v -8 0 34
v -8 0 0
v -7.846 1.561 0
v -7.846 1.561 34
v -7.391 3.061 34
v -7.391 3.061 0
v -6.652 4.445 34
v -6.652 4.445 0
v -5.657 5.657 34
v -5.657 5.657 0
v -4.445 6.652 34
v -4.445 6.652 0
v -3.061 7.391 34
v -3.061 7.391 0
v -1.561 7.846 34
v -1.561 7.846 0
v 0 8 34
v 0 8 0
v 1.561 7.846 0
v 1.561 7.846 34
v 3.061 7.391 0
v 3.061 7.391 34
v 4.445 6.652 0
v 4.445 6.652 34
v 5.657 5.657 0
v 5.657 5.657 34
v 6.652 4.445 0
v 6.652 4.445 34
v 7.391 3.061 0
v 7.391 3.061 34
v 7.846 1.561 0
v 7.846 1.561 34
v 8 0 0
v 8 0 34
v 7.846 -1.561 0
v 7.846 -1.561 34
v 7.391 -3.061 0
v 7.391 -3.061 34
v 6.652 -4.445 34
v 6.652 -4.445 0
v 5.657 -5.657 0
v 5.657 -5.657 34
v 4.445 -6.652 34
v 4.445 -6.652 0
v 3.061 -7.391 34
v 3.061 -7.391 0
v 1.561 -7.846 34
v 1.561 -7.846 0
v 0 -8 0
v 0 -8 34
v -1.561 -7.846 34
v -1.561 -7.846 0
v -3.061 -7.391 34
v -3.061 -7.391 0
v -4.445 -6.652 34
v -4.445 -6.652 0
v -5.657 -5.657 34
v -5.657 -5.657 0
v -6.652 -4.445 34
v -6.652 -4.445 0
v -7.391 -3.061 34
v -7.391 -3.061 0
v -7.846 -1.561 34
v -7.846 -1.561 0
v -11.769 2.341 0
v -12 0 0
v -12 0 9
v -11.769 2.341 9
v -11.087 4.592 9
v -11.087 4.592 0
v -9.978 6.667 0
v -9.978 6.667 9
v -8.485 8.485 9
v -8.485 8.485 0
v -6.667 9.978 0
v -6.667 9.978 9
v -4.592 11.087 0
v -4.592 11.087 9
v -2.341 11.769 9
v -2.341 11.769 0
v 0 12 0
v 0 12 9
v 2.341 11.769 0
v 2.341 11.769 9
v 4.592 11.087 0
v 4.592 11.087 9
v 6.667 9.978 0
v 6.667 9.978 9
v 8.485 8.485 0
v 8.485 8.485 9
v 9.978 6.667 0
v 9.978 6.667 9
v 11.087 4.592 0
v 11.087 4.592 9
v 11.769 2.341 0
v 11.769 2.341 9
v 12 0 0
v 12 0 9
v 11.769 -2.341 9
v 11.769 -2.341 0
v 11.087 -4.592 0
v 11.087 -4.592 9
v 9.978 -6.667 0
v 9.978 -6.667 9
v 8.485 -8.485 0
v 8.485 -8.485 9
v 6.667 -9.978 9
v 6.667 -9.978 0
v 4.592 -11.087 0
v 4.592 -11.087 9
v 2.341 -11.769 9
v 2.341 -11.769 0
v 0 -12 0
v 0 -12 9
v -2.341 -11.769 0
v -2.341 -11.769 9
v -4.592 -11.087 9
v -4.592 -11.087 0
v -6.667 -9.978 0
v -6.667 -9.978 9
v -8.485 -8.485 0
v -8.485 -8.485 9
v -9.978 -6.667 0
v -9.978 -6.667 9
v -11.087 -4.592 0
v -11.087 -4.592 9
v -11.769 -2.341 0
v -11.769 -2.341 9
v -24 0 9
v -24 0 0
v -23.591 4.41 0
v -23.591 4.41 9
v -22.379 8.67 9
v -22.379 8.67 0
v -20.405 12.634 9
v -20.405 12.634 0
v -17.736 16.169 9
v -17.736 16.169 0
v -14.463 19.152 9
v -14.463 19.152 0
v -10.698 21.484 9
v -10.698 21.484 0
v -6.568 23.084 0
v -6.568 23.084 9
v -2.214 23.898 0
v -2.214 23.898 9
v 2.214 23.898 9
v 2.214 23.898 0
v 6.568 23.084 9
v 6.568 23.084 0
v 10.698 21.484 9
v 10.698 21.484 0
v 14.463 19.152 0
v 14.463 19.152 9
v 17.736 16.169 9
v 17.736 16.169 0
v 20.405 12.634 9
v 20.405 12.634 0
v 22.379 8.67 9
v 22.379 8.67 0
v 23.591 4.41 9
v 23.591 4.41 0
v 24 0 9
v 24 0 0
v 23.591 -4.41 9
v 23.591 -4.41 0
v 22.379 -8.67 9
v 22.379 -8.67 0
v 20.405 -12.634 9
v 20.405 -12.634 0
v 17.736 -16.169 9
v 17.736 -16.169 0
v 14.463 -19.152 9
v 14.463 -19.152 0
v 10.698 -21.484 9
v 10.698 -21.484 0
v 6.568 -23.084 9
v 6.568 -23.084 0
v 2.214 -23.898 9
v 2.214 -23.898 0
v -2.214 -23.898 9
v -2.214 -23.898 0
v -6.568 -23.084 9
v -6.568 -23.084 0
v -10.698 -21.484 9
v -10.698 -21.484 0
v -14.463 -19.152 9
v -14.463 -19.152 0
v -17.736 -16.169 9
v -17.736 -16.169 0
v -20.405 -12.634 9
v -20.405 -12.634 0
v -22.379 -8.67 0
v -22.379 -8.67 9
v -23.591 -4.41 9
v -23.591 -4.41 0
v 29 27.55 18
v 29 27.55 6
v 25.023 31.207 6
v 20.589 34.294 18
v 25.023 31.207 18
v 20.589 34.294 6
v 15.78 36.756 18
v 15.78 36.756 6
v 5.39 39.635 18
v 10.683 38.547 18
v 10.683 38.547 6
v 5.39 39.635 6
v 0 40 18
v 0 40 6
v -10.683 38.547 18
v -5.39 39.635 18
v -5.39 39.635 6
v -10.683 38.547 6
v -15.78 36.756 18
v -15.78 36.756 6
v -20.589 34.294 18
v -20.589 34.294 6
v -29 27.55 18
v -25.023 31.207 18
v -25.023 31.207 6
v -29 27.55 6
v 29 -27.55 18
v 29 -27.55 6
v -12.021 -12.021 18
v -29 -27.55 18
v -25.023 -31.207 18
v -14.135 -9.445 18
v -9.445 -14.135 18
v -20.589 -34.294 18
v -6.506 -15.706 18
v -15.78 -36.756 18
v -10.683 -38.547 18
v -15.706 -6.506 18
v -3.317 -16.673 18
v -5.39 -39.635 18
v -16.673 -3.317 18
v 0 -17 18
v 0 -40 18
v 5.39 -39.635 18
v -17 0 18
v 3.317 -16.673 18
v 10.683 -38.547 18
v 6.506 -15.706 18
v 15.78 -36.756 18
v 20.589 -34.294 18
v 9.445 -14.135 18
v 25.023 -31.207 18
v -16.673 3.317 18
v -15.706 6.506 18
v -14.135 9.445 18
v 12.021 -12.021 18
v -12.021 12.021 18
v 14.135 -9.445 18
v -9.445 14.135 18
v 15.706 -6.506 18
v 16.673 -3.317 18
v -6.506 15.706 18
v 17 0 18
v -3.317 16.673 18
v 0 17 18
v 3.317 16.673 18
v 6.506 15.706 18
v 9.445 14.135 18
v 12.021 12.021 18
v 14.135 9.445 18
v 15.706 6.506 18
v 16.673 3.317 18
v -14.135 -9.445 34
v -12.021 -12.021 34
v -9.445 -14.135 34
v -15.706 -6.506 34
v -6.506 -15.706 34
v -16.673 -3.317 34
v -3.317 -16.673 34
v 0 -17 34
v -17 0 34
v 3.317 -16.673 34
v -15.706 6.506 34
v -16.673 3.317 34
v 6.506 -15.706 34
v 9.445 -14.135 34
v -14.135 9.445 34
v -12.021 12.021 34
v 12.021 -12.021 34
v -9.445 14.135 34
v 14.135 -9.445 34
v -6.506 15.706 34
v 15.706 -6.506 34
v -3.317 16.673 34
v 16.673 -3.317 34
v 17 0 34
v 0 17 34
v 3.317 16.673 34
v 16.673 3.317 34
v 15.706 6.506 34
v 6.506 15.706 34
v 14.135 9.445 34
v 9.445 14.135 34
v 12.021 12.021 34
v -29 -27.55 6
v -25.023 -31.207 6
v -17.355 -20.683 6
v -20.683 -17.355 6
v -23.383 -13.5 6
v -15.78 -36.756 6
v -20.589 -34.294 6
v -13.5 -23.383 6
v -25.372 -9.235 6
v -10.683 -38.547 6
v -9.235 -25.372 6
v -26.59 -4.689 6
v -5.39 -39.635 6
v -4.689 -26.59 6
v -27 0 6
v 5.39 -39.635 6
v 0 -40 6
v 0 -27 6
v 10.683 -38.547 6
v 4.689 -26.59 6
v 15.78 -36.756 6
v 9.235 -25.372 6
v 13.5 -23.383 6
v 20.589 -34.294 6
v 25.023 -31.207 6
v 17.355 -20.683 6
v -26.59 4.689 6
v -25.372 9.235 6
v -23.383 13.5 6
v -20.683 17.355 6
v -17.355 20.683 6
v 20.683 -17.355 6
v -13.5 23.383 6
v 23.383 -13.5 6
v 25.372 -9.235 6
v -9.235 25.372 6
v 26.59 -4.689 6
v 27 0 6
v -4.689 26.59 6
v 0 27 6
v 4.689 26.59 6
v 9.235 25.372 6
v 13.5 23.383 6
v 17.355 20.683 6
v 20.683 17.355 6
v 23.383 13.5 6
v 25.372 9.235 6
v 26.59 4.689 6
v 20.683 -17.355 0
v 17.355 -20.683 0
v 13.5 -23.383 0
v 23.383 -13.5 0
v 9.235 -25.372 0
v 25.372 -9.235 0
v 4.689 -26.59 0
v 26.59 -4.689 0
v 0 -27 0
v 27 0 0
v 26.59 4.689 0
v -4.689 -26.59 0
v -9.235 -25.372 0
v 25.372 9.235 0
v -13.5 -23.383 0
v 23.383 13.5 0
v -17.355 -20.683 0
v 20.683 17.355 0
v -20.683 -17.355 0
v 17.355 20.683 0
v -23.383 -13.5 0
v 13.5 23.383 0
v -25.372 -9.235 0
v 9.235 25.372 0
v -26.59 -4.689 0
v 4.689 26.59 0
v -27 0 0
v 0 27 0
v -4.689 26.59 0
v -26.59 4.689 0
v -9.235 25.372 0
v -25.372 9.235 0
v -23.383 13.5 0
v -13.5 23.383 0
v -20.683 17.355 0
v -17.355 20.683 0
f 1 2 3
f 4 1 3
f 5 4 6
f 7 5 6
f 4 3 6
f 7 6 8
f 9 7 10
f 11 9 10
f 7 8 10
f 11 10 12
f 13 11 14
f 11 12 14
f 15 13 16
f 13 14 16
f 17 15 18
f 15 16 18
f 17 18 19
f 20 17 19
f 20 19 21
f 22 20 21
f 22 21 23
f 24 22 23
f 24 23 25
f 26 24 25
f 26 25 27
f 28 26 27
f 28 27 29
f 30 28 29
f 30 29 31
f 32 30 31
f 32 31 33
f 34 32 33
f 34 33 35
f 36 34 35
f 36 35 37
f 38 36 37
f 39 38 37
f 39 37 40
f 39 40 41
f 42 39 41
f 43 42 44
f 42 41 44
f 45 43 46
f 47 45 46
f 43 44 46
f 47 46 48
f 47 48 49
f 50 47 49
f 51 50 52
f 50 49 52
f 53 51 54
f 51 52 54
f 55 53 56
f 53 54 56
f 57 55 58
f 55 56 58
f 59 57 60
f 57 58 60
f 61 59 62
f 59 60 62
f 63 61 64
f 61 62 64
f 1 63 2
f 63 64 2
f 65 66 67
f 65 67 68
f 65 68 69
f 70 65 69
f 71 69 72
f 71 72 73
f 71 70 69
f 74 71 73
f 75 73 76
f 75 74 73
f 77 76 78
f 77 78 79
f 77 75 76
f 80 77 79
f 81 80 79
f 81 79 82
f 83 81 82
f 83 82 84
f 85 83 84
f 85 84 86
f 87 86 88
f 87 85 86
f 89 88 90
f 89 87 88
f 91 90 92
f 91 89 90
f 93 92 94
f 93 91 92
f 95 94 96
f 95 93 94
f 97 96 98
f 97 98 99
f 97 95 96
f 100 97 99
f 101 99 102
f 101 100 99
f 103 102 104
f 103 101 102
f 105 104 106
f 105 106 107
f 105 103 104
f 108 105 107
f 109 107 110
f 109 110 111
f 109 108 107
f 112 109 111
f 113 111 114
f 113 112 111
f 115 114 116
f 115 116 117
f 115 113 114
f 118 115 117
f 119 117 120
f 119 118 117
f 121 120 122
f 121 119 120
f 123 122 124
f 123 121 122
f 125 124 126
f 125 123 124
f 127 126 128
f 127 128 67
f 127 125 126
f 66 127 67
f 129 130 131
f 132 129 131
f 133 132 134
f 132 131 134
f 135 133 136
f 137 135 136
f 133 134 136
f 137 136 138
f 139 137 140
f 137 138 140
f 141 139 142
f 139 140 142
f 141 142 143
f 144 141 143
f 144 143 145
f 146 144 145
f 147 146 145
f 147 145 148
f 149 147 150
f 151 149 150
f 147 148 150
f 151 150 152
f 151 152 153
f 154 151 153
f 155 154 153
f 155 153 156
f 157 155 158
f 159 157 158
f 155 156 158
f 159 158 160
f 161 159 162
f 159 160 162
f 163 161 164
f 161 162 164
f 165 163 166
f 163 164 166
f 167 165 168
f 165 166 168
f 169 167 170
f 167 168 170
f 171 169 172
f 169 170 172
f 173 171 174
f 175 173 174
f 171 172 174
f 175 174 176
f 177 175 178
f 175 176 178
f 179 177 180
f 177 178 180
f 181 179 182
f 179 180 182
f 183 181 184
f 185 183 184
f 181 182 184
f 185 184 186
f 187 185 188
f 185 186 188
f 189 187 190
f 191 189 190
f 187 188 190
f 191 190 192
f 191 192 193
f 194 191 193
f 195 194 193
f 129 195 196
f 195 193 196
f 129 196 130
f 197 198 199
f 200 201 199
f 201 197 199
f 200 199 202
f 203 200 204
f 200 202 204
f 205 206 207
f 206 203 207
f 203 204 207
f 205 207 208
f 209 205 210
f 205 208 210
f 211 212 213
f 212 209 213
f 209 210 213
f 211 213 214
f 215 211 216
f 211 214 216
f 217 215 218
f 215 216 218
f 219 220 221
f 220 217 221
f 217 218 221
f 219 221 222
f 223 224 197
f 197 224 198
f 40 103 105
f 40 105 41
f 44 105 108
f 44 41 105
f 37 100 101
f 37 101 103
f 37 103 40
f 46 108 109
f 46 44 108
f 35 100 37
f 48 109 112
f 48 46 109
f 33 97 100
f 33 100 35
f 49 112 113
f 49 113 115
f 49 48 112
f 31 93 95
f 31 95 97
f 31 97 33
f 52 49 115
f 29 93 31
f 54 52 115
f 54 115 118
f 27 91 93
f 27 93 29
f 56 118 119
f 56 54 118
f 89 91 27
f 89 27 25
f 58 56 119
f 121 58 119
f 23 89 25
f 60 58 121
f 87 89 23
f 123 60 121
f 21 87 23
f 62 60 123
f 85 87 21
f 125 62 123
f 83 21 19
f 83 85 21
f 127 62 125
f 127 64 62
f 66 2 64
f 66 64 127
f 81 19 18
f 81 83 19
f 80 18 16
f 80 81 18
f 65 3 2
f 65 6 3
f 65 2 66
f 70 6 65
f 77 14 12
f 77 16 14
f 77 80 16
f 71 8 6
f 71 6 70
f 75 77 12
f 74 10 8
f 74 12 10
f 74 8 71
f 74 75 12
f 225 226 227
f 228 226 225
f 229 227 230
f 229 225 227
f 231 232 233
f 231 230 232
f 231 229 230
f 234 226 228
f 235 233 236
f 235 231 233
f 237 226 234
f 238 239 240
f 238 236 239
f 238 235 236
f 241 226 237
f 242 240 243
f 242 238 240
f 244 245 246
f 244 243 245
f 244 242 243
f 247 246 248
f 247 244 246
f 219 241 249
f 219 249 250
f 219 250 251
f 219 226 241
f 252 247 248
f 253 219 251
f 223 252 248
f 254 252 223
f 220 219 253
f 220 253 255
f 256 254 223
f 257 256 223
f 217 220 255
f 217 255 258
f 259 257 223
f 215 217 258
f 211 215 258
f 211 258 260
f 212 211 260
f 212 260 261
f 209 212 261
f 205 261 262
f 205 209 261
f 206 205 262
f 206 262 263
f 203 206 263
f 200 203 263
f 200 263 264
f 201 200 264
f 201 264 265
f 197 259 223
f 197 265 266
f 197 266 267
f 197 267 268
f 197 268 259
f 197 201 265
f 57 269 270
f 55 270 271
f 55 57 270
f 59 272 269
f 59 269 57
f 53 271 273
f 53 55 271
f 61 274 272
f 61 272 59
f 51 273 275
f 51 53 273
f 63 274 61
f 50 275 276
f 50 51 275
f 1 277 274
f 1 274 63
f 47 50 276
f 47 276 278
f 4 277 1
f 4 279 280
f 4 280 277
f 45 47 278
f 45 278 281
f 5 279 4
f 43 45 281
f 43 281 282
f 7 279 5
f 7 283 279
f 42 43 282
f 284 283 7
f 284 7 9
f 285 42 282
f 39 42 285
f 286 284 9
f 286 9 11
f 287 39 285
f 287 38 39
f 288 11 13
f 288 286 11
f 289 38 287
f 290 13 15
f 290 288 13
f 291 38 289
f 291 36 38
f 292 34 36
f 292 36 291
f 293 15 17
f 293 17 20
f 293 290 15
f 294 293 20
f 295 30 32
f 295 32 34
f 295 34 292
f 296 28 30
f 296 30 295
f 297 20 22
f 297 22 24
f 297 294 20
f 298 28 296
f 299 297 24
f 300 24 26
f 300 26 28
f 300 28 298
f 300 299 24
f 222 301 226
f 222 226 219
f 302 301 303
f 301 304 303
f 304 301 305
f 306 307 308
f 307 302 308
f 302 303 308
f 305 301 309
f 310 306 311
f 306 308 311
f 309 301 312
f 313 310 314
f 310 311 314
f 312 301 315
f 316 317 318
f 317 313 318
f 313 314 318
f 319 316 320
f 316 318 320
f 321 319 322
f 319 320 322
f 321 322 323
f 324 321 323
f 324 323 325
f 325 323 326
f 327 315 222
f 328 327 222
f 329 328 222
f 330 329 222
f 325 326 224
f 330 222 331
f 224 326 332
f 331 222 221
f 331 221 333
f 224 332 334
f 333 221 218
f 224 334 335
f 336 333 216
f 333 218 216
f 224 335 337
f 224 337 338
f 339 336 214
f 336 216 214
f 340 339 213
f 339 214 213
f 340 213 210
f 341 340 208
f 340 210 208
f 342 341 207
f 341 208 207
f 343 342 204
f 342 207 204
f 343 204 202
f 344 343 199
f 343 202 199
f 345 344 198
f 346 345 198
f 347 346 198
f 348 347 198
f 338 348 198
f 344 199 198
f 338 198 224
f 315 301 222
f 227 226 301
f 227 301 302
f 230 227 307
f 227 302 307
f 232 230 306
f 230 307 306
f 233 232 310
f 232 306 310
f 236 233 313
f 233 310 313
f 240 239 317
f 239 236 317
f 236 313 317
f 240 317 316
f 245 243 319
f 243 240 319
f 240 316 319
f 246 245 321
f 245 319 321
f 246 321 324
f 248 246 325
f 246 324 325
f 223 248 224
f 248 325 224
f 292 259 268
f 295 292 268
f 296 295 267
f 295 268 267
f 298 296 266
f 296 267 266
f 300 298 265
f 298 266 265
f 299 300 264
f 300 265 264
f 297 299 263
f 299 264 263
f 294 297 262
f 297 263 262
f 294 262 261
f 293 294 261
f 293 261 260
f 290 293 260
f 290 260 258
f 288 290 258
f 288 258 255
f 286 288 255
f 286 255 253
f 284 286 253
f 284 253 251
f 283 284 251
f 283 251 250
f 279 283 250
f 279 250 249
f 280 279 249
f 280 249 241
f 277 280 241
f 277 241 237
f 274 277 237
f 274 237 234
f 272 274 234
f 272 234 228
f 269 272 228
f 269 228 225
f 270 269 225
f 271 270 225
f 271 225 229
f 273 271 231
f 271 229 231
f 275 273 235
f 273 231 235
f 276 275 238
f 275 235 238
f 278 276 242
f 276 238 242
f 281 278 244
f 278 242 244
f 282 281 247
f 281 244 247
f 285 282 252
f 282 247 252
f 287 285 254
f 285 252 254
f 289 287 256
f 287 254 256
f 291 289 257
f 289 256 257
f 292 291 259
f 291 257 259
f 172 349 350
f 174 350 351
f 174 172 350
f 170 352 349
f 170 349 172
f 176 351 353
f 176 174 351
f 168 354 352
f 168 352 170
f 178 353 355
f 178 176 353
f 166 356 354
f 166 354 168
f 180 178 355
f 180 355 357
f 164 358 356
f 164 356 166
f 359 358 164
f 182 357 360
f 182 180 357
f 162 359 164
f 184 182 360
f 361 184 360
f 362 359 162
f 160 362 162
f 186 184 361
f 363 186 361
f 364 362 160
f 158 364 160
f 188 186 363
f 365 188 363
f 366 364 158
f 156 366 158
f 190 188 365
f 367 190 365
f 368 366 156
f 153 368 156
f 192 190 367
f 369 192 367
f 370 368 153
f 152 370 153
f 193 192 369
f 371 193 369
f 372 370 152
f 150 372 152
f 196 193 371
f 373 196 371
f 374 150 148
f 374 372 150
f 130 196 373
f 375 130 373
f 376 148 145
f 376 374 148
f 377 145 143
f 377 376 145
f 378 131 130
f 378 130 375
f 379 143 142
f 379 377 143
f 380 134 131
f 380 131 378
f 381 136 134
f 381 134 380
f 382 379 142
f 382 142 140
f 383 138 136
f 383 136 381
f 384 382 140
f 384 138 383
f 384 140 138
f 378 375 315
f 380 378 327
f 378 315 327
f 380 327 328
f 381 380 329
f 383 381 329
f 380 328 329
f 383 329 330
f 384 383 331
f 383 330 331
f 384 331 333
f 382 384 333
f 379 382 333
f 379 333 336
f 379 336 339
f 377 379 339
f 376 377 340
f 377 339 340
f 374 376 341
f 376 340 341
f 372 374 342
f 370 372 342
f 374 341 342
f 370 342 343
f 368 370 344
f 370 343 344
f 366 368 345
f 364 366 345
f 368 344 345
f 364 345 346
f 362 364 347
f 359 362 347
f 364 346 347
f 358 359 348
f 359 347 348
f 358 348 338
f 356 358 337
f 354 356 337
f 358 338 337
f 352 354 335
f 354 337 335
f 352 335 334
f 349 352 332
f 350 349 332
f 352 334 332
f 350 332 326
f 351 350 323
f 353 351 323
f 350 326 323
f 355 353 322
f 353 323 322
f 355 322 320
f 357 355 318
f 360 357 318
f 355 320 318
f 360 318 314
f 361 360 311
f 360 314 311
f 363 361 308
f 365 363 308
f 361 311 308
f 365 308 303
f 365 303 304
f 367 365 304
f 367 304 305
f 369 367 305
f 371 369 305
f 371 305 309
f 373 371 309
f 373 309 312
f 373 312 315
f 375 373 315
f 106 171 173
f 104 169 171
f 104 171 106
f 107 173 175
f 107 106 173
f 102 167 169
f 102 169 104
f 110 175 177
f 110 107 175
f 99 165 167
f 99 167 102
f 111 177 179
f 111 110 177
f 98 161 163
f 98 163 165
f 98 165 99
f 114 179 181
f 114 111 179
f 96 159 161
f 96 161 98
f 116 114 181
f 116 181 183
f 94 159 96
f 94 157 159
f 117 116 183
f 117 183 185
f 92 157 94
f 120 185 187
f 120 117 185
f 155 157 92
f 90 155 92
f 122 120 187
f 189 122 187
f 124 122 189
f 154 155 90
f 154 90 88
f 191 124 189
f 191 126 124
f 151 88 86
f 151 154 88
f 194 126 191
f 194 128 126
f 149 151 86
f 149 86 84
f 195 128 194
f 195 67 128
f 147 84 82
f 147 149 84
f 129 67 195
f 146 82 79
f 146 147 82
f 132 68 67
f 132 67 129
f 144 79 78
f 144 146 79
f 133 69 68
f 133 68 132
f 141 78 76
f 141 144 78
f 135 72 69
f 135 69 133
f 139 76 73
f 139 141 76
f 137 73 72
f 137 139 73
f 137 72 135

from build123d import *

# Parameters (mm, degrees)
SKETCH_1_R           = 17
EXTRUDE_1_DEPTH      = 34
EXTRUDE_START        = 6
SKETCH_2_R           = 40
EXTRUDE_2_DEPTH      = 12
SKETCH_3_R           = 27
EXTRUDE_3_DEPTH      = 6
SKETCH_4_R           = 24
SKETCH_4_R_2         = 12
CUT_EXTRUDE_1_DEPTH  = 9
SKETCH_5_OUTSIDE_W   = 105.628
SKETCH_5_OUTSIDE_H   = 105.628
SKETCH_5_OUTSIDE_W_2 = 58
SKETCH_5_OUTSIDE_H_2 = 80
SKETCH_5_OUTSIDE_R   = 8
CUT_EXTRUDE_2_DEPTH  = 35


with BuildPart() as part:
    # 草圖1 → 填料-伸長1 (new body)
    with BuildSketch(Plane.XY):
        Circle(SKETCH_1_R)
    extrude(amount=EXTRUDE_1_DEPTH)

    # 草圖2 → 填料-伸長2 (add)
    with BuildSketch(Plane.XY.offset(EXTRUDE_START)):
        Circle(SKETCH_2_R)
    extrude(amount=EXTRUDE_2_DEPTH)

    # 草圖3 → 填料-伸長3 (add)
    with BuildSketch(Plane(origin=(0, 0, 6), x_dir=(-1, 0, 0), z_dir=(0, 0, -1))):
        Circle(SKETCH_3_R)
    extrude(amount=EXTRUDE_3_DEPTH)

    # 草圖4 → 除料-伸長1 (cut)
    with BuildSketch(Plane(origin=(0, 0, 0), x_dir=(-1, 0, 0), z_dir=(0, 0, -1))):
        Circle(SKETCH_4_R)
        Circle(SKETCH_4_R_2, mode=Mode.SUBTRACT)
    extrude(amount=-CUT_EXTRUDE_1_DEPTH, mode=Mode.SUBTRACT)

    # 草圖5 outside → 除料-伸長2 (cut, through all)
    with BuildSketch(Plane(origin=(0, 0, 0), x_dir=(-1, 0, 0), z_dir=(0, 0, -1))):
        Rectangle(SKETCH_5_OUTSIDE_W, SKETCH_5_OUTSIDE_H)
        Rectangle(SKETCH_5_OUTSIDE_W_2, SKETCH_5_OUTSIDE_H_2, mode=Mode.SUBTRACT)
        Circle(SKETCH_5_OUTSIDE_R)
    extrude(amount=-CUT_EXTRUDE_2_DEPTH, mode=Mode.SUBTRACT)


solid = part.part
